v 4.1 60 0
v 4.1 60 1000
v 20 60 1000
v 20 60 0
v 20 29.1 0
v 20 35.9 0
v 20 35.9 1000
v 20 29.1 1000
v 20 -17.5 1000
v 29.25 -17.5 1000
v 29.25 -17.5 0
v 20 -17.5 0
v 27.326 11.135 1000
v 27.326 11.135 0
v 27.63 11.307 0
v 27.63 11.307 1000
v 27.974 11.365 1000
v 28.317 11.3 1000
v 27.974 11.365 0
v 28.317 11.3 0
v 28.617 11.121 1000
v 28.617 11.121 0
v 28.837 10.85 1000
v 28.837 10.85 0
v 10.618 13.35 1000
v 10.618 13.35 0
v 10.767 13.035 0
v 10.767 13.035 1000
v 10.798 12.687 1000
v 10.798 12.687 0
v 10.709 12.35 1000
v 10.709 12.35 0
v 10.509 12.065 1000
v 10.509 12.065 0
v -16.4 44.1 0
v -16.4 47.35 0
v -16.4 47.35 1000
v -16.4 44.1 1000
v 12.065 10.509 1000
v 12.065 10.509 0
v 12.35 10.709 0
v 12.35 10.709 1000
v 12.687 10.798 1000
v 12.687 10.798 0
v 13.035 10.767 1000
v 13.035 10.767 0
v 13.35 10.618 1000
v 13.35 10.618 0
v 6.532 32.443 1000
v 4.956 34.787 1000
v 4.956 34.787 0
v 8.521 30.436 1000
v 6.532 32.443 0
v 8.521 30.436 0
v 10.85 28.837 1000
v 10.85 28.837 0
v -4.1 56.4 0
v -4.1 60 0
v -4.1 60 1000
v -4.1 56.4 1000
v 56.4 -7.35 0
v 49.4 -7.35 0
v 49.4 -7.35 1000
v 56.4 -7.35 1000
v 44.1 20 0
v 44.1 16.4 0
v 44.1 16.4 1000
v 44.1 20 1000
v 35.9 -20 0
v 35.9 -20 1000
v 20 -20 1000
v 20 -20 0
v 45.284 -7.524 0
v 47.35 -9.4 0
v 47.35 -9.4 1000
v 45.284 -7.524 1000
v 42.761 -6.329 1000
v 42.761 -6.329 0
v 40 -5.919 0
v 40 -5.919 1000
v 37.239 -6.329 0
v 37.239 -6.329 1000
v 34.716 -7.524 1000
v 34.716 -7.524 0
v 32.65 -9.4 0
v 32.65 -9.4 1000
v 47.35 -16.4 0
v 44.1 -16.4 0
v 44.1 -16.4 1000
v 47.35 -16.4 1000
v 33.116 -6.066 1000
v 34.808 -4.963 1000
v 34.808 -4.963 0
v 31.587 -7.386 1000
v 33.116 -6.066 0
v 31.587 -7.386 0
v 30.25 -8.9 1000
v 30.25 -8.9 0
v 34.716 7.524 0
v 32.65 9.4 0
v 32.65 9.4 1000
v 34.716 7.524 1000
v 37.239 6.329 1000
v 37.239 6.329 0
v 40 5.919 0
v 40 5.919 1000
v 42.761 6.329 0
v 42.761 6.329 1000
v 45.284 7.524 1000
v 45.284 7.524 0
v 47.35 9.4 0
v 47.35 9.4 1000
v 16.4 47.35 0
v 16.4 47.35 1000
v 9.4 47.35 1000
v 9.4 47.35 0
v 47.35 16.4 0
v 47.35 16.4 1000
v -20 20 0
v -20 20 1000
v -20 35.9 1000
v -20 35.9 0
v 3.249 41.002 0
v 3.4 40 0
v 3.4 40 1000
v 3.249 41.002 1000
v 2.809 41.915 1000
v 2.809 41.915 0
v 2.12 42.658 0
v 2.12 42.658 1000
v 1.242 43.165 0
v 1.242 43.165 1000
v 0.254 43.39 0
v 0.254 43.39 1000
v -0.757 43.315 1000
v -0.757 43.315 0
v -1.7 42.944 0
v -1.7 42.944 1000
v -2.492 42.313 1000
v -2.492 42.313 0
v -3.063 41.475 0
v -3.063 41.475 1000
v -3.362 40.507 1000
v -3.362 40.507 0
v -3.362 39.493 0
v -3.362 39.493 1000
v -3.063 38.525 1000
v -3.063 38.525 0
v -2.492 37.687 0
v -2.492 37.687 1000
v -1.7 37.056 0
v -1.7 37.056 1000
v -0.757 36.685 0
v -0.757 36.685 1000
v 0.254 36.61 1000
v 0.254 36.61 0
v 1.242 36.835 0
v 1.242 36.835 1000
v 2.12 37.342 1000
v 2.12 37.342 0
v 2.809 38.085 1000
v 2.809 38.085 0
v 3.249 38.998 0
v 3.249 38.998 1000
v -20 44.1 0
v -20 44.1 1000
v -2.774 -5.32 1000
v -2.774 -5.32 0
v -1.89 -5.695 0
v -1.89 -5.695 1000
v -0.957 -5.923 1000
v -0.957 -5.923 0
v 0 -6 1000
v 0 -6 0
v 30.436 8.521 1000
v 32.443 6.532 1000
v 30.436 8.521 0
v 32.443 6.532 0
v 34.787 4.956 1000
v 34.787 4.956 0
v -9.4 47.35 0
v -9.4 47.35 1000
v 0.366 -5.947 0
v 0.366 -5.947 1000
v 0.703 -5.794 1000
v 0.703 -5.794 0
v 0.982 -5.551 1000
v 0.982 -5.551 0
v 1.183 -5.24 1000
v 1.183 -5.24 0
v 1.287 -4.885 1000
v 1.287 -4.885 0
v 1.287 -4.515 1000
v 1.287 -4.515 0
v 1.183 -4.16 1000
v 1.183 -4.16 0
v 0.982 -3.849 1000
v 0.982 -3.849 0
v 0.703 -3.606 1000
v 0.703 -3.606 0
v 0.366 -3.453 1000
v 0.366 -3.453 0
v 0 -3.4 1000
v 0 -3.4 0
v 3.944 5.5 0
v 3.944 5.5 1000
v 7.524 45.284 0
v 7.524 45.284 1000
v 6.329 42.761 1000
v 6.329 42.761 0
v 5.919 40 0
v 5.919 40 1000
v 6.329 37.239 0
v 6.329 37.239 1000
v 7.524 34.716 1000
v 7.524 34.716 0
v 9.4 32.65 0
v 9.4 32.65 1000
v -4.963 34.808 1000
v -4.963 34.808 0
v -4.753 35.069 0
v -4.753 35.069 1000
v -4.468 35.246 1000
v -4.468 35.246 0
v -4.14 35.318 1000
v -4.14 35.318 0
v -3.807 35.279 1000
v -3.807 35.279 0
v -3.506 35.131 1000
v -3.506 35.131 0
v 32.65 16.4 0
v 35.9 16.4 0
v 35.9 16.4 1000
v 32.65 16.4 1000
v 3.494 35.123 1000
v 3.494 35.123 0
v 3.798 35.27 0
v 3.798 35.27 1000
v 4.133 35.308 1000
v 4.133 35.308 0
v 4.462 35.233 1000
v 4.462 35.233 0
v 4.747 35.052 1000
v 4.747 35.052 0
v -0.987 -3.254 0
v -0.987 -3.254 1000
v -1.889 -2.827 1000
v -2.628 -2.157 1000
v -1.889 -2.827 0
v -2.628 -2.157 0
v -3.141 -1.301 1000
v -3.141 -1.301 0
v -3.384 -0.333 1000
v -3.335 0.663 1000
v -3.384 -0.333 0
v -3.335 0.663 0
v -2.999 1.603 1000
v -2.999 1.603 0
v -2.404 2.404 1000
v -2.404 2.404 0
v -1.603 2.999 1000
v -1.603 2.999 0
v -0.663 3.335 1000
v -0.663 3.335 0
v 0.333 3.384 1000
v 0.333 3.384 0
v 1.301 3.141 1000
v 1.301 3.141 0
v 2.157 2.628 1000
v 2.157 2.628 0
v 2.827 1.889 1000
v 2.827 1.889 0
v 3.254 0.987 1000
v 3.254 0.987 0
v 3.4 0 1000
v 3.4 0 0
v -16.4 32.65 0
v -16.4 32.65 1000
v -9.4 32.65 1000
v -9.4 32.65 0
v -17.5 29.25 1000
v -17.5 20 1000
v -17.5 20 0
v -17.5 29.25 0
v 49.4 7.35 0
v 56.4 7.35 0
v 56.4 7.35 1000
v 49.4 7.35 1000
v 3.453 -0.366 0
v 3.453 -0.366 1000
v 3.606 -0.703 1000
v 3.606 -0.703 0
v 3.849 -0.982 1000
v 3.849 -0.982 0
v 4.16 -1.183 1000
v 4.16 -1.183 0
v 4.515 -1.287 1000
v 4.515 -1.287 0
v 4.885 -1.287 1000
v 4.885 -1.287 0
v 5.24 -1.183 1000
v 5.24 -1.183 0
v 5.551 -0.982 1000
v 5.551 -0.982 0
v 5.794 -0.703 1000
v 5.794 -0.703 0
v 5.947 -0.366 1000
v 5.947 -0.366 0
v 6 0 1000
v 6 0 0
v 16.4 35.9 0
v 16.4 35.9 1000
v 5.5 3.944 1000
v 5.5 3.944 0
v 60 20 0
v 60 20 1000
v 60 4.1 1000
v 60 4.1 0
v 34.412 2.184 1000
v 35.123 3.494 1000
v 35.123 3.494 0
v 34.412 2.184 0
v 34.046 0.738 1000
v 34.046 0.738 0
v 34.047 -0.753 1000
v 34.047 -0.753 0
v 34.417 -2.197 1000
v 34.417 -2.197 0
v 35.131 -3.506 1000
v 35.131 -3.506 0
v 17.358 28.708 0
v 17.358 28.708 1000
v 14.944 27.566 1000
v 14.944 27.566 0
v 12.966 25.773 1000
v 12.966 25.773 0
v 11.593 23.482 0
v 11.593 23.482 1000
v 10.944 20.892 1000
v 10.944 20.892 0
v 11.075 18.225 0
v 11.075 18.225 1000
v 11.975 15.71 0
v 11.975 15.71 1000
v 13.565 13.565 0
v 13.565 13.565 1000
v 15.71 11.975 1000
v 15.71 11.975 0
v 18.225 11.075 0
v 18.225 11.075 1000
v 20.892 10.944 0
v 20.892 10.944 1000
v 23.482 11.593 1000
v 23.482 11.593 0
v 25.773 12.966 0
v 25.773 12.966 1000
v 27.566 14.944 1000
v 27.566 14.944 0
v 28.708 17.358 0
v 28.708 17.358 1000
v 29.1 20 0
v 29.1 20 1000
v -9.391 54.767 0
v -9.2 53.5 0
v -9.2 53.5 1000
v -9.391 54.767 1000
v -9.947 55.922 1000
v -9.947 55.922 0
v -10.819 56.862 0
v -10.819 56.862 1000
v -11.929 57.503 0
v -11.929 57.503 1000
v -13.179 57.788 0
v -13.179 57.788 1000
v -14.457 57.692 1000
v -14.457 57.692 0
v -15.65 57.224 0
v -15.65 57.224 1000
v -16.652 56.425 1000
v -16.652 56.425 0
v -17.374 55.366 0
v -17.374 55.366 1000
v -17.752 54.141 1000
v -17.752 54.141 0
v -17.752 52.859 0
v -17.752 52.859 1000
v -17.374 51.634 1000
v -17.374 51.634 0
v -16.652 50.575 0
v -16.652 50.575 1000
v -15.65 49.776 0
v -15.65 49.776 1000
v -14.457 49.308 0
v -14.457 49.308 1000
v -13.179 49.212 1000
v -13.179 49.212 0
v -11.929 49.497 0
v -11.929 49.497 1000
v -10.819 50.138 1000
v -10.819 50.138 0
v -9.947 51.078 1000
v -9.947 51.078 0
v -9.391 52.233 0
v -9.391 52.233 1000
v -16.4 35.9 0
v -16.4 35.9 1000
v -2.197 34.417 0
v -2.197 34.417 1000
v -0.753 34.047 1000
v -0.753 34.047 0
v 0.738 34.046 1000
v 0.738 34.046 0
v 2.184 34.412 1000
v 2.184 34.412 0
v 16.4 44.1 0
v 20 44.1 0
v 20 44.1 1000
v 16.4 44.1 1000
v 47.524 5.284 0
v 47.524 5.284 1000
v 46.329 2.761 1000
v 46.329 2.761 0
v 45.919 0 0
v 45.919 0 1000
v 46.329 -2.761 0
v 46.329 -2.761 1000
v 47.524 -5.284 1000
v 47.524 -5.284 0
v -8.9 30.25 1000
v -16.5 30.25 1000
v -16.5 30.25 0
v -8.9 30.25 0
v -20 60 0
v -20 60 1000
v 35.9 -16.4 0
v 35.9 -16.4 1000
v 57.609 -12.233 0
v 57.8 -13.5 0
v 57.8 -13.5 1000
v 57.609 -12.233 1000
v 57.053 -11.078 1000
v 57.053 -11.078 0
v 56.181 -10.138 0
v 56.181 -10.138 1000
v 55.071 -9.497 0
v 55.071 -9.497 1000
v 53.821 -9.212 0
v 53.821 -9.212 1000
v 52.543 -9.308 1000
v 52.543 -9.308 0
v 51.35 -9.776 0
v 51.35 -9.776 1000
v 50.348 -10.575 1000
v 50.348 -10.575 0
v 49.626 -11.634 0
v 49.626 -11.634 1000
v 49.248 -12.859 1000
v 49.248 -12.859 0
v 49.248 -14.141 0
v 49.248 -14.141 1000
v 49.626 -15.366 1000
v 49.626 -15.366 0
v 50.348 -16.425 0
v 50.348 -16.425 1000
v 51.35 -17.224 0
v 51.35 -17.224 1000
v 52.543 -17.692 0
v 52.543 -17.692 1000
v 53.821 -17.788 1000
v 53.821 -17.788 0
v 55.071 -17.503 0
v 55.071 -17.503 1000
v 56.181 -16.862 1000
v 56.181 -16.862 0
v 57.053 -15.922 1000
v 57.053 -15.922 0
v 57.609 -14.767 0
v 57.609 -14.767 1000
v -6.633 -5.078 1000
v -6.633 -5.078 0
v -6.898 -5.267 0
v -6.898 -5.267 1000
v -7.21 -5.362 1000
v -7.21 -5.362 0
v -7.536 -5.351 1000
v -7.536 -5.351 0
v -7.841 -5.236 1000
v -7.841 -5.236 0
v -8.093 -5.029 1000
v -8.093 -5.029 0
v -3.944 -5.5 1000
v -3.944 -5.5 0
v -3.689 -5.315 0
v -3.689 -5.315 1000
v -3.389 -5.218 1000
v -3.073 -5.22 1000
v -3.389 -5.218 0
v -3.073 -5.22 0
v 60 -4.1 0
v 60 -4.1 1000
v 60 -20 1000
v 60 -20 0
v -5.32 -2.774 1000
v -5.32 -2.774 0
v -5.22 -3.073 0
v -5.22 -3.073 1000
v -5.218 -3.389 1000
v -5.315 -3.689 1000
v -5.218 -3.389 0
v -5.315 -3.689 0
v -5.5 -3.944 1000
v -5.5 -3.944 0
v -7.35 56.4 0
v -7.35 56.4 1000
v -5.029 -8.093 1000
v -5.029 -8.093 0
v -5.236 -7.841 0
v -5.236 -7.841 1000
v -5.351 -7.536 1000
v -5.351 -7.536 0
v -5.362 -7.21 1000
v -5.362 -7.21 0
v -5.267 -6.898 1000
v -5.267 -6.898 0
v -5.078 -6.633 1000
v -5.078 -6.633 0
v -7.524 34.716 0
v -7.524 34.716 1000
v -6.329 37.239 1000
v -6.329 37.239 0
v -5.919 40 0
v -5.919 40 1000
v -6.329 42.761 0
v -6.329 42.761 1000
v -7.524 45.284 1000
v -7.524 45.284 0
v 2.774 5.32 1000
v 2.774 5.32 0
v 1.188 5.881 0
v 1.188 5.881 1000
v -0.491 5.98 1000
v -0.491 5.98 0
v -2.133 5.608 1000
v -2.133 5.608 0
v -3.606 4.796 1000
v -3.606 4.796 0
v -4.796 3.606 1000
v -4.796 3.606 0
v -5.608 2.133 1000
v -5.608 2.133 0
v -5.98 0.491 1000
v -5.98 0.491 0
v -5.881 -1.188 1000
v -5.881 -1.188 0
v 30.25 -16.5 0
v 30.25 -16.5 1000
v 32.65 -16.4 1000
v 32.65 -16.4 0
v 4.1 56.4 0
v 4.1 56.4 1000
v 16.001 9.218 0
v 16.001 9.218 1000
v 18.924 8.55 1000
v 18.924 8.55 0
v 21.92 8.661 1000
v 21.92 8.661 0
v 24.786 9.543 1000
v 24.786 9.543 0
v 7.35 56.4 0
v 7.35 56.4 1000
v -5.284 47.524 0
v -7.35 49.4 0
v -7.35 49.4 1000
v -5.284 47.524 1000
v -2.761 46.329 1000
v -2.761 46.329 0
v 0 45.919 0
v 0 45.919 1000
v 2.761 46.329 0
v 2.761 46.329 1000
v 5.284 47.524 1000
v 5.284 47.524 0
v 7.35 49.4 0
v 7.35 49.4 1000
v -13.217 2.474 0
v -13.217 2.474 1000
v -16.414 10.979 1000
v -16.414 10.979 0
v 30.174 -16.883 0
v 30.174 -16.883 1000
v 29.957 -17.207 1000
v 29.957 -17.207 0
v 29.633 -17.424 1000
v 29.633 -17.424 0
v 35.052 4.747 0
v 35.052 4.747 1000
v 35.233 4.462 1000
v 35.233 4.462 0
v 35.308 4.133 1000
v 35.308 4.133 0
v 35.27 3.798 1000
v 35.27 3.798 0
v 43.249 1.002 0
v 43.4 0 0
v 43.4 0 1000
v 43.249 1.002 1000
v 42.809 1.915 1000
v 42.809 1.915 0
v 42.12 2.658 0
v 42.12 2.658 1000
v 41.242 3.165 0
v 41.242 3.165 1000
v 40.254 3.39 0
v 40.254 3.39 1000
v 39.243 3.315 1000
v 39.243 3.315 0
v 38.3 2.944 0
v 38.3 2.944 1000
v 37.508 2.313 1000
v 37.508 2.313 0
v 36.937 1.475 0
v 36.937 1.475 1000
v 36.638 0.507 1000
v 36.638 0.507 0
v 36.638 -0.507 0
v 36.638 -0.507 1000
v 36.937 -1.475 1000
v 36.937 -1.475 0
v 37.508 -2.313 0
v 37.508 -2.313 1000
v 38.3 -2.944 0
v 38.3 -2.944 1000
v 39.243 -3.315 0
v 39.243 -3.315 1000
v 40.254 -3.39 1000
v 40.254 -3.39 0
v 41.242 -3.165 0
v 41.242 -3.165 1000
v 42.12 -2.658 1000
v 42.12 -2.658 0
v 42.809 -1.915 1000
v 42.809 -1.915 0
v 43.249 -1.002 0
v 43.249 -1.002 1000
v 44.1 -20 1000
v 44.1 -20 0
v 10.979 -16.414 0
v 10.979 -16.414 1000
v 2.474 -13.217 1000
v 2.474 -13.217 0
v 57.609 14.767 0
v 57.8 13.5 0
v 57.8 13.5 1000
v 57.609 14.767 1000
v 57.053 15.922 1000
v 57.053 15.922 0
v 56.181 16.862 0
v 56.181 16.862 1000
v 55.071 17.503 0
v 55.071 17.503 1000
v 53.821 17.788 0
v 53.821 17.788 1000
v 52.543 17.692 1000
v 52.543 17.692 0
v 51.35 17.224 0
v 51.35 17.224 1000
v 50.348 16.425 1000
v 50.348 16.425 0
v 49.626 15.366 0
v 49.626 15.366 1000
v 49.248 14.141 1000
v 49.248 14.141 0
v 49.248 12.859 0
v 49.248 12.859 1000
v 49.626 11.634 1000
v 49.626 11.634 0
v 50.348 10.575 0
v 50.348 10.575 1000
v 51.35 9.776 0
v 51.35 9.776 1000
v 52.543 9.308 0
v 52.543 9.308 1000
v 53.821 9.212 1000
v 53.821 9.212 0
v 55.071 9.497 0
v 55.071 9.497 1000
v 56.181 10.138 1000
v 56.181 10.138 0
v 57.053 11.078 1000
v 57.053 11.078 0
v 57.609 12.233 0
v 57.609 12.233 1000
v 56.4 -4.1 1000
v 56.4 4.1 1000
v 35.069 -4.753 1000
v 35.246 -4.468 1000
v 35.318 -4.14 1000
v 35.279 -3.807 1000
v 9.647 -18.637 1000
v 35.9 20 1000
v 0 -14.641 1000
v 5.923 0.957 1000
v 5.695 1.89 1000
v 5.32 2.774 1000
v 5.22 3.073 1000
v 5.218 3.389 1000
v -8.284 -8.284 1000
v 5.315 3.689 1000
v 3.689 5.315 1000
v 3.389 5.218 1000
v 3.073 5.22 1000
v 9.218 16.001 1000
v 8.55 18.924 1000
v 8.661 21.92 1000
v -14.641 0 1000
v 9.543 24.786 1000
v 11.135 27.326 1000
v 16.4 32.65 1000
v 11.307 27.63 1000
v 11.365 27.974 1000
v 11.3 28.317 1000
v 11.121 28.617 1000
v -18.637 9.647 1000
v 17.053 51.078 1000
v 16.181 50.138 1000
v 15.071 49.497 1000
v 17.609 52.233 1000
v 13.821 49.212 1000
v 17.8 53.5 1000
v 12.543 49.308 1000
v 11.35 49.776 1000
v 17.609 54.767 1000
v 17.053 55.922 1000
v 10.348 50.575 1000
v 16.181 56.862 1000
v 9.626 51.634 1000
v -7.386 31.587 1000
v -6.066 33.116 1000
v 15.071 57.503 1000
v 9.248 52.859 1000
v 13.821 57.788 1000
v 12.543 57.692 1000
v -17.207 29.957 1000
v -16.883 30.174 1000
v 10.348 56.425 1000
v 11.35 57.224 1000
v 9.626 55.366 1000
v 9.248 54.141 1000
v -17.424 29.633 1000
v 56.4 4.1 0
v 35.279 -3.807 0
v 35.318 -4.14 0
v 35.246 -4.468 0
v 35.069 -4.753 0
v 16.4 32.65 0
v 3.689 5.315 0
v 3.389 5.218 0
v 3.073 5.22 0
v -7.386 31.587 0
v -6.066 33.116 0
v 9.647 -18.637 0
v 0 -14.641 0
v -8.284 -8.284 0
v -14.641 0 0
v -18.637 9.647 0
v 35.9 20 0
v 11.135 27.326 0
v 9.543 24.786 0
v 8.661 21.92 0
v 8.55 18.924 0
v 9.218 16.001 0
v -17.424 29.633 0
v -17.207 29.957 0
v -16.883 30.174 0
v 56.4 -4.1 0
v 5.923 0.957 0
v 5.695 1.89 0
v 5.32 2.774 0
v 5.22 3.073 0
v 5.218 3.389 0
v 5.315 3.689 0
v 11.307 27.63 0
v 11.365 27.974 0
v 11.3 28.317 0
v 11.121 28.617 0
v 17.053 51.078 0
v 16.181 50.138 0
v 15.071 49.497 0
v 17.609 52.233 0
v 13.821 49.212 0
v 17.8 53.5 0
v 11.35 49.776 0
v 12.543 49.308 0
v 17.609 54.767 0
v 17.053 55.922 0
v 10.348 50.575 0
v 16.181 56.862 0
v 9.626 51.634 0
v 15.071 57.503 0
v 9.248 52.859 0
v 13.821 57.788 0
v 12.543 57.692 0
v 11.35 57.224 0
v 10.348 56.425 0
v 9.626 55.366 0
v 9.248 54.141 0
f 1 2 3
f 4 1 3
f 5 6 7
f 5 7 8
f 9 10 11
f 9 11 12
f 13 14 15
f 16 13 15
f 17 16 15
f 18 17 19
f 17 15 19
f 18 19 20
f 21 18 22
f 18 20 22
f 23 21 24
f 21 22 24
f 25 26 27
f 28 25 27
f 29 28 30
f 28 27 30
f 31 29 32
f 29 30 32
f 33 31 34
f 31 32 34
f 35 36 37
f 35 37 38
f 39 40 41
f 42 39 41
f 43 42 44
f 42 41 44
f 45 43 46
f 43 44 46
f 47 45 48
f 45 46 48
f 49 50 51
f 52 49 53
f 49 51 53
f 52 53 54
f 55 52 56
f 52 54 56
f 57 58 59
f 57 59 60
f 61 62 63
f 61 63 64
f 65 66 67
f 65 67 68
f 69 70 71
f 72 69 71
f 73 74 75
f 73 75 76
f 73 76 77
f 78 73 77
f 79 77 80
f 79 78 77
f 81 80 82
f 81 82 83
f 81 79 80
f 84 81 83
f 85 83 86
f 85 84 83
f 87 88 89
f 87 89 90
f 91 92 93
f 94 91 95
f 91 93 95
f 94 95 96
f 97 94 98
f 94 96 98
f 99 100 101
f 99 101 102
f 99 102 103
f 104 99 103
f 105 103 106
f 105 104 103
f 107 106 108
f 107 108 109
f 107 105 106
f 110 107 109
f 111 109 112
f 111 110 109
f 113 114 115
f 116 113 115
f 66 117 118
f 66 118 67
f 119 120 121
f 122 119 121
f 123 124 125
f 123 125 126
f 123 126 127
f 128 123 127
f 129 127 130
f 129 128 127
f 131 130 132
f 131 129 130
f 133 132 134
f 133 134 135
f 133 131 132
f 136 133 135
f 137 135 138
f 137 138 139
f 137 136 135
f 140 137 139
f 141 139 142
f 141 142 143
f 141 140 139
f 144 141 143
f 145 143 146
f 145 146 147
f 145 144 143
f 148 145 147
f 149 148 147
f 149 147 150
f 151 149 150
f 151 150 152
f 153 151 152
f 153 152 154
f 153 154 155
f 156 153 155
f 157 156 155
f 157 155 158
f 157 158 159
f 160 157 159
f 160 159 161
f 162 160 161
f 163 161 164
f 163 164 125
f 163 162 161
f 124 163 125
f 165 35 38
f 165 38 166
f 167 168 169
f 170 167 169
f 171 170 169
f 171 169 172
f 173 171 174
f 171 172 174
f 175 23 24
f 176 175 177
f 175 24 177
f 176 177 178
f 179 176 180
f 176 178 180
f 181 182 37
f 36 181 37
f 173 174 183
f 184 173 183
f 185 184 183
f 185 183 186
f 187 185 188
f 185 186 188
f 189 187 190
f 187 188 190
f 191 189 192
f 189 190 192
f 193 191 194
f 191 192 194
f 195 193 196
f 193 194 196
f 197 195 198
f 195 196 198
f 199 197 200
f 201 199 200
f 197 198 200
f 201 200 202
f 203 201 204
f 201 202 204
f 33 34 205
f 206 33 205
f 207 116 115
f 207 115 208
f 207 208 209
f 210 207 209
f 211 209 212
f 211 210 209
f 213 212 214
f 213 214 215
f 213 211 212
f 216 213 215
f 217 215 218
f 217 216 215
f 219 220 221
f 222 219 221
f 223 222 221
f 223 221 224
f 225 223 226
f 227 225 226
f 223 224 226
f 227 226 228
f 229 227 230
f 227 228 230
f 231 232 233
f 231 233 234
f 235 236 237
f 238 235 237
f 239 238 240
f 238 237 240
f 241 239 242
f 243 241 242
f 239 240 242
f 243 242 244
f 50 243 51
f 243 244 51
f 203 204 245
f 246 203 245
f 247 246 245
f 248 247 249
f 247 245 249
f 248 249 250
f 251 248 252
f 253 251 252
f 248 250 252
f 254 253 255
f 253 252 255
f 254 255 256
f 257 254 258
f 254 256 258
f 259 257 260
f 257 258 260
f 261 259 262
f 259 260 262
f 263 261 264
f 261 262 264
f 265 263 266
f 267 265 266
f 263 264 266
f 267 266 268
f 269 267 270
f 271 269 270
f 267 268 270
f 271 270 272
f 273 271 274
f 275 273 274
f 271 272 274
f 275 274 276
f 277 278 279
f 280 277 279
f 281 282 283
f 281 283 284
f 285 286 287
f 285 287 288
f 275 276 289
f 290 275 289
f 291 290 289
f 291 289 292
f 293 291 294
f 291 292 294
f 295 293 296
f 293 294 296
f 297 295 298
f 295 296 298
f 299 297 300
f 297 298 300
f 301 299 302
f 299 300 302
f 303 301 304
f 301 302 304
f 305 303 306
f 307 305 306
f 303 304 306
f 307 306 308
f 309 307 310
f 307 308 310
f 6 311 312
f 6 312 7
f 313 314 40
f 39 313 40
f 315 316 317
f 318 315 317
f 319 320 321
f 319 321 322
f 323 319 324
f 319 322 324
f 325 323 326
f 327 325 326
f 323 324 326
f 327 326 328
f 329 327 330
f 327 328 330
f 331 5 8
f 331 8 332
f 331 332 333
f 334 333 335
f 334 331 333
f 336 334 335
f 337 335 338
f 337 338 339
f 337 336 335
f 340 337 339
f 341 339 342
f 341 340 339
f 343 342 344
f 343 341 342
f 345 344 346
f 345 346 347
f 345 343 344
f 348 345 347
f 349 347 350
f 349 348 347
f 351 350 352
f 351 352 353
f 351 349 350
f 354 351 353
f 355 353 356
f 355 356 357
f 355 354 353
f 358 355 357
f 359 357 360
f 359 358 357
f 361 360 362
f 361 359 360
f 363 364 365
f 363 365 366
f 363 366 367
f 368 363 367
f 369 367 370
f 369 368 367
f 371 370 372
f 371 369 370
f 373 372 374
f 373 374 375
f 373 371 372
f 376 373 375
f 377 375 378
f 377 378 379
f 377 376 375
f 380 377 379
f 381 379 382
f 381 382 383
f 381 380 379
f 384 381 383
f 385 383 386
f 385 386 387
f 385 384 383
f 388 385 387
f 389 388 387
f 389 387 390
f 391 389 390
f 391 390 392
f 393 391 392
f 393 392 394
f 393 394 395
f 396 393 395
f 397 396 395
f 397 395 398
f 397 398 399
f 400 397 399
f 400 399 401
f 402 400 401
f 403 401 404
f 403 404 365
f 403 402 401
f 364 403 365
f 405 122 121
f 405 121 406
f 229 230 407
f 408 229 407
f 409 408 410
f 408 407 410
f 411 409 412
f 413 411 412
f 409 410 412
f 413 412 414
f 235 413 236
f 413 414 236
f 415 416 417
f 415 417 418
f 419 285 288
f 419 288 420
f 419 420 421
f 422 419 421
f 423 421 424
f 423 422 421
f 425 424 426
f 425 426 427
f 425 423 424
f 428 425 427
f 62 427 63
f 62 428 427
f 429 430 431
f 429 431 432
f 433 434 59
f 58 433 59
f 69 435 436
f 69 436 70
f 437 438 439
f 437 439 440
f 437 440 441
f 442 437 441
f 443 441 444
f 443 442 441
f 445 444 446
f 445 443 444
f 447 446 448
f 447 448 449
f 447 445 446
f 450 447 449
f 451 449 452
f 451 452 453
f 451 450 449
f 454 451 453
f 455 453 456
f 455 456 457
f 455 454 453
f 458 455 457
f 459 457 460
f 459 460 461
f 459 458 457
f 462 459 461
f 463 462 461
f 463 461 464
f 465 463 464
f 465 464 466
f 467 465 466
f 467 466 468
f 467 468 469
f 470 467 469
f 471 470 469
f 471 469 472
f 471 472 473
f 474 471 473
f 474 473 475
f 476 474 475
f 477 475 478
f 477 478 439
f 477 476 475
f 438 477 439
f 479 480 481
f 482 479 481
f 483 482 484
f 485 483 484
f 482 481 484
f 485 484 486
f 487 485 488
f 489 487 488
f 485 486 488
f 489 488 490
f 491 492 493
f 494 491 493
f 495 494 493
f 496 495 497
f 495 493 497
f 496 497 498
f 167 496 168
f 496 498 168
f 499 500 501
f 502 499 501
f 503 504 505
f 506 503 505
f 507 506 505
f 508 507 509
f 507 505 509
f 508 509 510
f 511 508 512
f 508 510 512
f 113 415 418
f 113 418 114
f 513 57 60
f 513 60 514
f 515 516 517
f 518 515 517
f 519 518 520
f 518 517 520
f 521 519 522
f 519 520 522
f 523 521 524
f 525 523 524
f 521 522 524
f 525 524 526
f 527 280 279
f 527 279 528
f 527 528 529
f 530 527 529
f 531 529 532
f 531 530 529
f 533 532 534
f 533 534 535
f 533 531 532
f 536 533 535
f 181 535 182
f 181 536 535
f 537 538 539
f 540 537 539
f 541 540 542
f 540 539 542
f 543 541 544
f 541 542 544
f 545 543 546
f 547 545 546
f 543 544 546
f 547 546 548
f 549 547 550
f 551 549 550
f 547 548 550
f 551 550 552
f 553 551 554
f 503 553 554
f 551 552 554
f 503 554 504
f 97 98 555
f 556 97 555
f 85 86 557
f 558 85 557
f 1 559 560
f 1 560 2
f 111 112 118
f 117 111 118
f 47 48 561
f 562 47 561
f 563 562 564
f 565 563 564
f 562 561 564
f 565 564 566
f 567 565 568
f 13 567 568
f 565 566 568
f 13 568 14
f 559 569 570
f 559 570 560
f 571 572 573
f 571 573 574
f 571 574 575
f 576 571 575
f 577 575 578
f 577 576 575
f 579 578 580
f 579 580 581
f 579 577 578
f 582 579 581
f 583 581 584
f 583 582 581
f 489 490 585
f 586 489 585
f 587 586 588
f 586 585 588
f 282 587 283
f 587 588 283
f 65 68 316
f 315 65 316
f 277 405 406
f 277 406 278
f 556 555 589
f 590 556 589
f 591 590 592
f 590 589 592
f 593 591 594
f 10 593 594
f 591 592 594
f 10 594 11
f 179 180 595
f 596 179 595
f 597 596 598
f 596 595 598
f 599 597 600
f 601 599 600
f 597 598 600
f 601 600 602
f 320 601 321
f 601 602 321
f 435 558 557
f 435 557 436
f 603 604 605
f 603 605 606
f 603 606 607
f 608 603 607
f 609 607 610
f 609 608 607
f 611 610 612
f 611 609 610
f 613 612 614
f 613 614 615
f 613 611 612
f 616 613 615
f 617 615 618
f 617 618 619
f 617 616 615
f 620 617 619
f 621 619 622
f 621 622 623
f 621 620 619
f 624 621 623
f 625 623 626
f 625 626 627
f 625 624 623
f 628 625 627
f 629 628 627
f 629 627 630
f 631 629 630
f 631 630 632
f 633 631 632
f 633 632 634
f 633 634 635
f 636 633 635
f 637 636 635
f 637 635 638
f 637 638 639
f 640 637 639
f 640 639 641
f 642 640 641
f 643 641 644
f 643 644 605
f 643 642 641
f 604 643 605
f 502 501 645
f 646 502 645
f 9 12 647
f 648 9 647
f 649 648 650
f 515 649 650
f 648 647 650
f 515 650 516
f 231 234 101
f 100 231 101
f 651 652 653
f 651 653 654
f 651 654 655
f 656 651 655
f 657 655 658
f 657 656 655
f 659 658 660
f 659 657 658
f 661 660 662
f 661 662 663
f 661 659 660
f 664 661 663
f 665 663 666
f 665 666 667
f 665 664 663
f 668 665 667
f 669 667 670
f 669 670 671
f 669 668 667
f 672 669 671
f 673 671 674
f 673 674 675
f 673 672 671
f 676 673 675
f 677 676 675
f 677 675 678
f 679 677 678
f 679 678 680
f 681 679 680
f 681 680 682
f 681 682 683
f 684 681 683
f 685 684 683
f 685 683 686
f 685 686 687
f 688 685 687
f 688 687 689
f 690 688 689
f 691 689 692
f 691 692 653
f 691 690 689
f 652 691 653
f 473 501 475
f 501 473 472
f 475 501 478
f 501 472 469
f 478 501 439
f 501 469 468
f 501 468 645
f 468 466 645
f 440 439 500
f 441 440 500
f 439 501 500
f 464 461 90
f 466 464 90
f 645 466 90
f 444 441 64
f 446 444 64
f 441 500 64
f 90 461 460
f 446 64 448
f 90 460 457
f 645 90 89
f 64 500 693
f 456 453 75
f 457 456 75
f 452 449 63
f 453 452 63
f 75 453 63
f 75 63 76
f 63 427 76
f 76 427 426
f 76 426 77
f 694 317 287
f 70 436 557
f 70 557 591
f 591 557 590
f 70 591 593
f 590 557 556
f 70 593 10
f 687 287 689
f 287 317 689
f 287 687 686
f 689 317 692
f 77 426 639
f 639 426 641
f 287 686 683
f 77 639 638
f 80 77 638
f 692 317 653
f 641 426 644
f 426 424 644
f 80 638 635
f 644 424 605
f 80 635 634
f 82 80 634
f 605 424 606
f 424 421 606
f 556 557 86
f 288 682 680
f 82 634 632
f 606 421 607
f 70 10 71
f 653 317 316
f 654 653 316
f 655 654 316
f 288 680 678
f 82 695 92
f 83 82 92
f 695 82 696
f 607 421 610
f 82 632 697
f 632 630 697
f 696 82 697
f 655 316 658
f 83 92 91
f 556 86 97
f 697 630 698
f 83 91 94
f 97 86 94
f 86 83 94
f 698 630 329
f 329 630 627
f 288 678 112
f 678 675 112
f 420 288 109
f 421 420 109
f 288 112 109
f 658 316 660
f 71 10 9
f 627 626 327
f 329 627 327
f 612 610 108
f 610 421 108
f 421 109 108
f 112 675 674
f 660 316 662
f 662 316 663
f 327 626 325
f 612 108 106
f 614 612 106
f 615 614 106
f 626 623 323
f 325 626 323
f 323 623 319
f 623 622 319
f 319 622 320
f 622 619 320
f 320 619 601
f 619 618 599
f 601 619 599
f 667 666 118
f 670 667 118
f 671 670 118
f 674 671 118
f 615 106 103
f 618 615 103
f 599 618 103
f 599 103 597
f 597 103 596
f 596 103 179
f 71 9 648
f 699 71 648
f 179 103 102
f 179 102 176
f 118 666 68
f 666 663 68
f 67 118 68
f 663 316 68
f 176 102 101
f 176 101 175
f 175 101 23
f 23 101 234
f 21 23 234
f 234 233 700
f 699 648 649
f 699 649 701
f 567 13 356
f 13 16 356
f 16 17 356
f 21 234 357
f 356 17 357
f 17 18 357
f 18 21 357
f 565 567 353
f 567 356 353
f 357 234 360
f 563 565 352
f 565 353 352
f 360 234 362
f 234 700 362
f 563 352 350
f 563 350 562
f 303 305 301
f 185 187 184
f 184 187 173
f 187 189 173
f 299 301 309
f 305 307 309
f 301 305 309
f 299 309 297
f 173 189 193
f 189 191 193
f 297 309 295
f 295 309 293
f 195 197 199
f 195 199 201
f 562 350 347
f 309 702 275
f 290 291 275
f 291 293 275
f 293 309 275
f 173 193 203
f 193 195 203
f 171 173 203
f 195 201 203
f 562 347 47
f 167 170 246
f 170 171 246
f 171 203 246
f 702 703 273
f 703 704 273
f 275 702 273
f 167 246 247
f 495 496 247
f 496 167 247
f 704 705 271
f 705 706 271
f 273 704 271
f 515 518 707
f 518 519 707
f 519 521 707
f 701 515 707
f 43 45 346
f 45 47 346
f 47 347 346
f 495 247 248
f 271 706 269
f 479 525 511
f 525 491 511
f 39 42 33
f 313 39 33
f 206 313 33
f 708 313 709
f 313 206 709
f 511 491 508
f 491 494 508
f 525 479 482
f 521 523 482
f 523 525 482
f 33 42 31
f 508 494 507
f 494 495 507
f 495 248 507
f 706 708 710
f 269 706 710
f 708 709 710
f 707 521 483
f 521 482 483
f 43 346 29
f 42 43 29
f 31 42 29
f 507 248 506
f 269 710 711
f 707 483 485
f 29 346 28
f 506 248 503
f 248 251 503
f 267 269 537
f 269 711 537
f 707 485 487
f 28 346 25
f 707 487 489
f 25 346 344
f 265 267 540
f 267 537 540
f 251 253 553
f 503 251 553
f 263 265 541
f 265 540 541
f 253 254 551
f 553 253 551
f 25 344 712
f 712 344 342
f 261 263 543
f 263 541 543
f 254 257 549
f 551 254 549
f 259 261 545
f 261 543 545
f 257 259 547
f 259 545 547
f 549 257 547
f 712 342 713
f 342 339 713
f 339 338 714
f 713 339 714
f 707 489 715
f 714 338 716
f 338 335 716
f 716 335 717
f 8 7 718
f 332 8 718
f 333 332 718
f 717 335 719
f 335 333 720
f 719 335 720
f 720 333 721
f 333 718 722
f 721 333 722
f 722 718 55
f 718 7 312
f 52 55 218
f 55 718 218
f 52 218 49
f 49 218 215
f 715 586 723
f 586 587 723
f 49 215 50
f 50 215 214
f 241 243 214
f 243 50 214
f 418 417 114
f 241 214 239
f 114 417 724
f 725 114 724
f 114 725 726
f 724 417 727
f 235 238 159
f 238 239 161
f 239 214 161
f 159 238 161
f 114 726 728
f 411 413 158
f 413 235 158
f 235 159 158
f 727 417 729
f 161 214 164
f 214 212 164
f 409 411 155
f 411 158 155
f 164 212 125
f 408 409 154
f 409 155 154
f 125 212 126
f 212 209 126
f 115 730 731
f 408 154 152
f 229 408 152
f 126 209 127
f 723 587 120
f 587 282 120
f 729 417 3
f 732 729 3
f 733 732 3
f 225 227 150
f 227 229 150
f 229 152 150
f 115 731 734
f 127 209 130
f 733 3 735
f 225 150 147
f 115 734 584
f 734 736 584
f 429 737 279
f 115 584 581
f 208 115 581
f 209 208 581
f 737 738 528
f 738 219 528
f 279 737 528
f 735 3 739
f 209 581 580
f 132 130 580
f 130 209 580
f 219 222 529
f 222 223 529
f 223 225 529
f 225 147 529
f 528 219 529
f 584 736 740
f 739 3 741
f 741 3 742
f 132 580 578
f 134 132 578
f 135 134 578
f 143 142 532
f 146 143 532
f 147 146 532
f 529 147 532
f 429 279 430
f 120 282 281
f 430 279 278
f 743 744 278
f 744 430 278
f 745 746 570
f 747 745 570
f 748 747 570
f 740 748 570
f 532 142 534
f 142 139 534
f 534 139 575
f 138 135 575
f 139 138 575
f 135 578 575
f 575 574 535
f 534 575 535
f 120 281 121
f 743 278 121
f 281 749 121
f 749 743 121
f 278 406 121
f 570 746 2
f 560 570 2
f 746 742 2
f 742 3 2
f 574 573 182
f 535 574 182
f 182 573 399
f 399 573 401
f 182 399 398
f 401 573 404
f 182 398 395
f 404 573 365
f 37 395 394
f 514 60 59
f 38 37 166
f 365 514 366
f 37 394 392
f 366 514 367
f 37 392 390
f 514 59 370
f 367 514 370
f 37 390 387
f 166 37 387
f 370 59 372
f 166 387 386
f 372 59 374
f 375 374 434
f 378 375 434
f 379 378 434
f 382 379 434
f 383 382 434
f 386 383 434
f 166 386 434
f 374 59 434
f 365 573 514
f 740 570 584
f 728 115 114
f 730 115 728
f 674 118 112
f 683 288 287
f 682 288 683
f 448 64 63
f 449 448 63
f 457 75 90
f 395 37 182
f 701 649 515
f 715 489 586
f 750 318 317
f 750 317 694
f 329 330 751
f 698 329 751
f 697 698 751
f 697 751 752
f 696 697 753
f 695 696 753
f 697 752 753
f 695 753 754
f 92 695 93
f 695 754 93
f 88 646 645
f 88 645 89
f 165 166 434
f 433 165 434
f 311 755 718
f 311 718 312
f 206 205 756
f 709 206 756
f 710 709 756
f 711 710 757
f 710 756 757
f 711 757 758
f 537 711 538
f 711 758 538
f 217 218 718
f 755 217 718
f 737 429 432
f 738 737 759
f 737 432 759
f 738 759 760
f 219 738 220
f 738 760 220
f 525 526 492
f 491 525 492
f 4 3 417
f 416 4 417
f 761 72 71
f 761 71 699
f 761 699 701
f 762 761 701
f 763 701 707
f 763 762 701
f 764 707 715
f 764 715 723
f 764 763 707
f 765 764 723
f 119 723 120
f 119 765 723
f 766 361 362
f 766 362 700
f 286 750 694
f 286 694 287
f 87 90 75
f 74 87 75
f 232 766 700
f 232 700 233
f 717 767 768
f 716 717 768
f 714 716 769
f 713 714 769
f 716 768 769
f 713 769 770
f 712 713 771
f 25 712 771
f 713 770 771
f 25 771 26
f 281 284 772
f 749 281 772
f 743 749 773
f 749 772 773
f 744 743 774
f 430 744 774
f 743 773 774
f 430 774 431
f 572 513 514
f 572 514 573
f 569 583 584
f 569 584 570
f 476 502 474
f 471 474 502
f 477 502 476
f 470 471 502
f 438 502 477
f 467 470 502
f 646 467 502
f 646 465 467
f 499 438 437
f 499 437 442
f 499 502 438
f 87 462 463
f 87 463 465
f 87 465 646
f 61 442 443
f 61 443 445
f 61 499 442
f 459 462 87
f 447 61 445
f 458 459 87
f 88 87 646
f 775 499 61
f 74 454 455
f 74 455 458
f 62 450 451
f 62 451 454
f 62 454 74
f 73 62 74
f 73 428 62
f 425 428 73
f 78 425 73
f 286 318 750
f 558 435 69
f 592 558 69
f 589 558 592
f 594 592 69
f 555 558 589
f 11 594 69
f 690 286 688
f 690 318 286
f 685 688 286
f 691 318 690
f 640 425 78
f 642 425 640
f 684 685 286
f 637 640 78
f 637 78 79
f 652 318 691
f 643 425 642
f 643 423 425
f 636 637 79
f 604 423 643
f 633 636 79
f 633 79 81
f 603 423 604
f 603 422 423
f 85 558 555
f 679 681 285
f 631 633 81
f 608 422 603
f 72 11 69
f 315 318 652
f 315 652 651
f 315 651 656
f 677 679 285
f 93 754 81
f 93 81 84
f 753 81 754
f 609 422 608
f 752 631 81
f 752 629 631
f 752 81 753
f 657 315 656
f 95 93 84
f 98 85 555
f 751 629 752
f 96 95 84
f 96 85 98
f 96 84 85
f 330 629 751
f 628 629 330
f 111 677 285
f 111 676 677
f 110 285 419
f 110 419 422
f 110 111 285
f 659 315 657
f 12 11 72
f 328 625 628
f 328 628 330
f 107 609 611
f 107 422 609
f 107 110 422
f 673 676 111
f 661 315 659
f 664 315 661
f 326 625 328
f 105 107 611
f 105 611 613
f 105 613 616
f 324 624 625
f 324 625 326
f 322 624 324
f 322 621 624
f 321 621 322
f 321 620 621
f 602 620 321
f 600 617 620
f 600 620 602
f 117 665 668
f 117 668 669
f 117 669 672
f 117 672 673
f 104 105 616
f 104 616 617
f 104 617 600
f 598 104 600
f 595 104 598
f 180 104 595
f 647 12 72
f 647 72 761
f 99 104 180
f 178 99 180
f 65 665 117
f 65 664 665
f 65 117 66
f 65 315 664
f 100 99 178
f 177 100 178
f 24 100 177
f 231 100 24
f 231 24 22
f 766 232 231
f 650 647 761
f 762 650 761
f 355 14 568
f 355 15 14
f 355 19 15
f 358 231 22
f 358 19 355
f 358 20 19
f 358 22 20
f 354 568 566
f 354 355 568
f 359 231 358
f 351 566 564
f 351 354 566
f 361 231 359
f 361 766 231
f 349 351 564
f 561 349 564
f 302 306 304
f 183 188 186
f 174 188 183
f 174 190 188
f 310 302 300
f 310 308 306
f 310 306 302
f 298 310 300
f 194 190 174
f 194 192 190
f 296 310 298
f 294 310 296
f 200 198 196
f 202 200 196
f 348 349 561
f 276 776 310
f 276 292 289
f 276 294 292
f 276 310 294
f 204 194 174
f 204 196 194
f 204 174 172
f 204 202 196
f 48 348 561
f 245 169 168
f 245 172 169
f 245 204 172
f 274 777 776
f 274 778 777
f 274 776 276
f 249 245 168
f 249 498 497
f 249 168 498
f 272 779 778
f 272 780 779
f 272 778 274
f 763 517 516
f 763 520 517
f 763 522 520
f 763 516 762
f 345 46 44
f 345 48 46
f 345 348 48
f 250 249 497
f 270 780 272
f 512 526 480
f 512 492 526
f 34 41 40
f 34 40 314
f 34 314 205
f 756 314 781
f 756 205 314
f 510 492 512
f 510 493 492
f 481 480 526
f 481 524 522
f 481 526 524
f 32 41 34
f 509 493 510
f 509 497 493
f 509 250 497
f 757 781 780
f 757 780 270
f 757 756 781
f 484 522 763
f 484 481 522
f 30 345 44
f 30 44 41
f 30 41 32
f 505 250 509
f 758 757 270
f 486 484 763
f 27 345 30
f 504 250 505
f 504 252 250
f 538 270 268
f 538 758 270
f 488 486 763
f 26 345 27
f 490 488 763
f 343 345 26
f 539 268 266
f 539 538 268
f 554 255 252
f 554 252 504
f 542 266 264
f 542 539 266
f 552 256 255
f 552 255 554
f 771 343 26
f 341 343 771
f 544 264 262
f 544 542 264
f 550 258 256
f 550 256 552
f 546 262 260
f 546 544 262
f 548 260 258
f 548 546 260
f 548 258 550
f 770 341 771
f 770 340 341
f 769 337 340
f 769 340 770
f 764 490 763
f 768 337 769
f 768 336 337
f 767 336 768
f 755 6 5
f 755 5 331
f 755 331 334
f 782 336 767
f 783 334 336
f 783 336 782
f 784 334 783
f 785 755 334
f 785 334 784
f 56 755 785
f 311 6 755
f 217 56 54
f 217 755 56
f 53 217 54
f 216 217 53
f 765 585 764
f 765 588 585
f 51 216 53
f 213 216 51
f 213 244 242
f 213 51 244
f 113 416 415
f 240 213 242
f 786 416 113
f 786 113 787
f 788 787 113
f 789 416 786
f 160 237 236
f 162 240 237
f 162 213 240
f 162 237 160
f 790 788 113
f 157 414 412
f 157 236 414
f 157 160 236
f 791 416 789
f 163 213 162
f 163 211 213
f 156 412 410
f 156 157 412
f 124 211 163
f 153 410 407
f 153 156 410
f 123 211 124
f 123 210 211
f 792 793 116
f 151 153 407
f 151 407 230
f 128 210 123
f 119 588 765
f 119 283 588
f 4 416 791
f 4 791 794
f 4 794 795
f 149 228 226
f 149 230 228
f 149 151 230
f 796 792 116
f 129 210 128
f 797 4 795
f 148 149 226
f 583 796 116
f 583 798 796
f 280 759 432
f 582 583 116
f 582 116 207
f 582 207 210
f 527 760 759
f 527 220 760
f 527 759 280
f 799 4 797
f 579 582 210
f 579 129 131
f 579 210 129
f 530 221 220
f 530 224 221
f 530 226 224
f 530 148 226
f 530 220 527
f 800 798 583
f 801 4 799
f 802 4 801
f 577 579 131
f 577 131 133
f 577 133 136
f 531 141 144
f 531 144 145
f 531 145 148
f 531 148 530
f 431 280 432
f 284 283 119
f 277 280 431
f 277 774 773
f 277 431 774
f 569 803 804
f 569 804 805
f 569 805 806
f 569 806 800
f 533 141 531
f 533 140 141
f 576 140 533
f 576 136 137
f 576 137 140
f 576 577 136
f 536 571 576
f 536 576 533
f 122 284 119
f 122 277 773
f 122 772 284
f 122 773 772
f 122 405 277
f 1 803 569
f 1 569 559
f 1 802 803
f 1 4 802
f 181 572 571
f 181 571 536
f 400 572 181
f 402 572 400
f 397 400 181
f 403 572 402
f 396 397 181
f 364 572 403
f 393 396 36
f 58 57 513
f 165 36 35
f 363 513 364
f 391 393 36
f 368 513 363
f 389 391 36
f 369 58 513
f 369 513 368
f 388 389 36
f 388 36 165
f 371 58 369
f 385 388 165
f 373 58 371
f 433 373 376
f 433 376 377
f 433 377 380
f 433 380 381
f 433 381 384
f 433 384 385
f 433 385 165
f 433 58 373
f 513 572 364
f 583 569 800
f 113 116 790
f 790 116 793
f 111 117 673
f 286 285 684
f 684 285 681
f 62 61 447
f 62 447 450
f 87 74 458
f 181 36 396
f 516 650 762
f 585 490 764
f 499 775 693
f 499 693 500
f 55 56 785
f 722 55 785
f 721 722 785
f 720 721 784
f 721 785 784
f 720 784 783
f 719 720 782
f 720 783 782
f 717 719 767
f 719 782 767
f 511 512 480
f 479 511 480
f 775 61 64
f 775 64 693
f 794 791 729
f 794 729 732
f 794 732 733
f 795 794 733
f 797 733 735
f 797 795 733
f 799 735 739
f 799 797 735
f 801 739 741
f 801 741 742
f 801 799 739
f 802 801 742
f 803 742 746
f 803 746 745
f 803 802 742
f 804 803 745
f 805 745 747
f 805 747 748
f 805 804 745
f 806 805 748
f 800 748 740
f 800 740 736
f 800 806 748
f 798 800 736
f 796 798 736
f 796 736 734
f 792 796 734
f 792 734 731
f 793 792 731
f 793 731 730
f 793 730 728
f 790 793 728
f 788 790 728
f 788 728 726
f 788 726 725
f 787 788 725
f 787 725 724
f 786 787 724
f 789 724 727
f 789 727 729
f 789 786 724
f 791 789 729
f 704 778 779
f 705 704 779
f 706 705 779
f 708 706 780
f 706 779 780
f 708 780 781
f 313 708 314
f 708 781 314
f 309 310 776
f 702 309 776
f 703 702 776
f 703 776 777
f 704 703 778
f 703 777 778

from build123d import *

# Parameters (mm, degrees)
SKETCH_1_R      = 3.4
SKETCH_1_R_2    = 4.3
EXTRUDE_1_DEPTH = 1000


with BuildPart() as part:
    # Эскиз1 → Бобышка-Вытянуть1 (new body)
    with BuildSketch(Plane.XY):
        with BuildLine():
            Line((-20, 47.35), (-20, 60))
            Line((-20, 60), (-7.35, 60))
            Line((-7.35, 60), (-4.1, 60))
            Line((-4.1, 60), (-4.1, 56.4))
            Line((-4.1, 56.4), (-7.35, 56.4))
            Line((-7.35, 56.4), (-7.35, 49.4))
            ThreePointArc((-7.35, 49.4), (0, 45.918928476), (7.35, 49.4))
            Line((7.35, 49.4), (7.35, 56.4))
            Line((7.35, 56.4), (4.1, 56.4))
            Line((4.1, 56.4), (4.1, 60))
            Line((4.1, 60), (7.35, 60))
            Line((7.35, 60), (20, 60))
            Line((20, 60), (20, 47.35))
            Line((20, 47.35), (20, 44.1))
            Line((20, 44.1), (16.4, 44.1))
            Line((16.4, 44.1), (16.4, 47.35))
            Line((16.4, 47.35), (9.4, 47.35))
            ThreePointArc((9.4, 47.35), (5.918928476, 40), (9.4, 32.65))
            Line((9.4, 32.65), (16.4, 32.65))
            Line((16.4, 32.65), (16.4, 35.9))
            Line((16.4, 35.9), (20, 35.9))
            Line((20, 35.9), (20, 32.65))
            Line((20, 32.65), (20, 29.1))
            ThreePointArc((20, 29.1), (13.565328291, 13.565328291), (29.1, 20))
            Line((29.1, 20), (32.65, 20))
            Line((32.65, 20), (35.9, 20))
            Line((35.9, 20), (35.9, 16.4))
            Line((35.9, 16.4), (32.65, 16.4))
            Line((32.65, 16.4), (32.65, 9.4))
            ThreePointArc((32.65, 9.4), (40, 5.918928476), (47.35, 9.4))
            Line((47.35, 9.4), (47.35, 16.4))
            Line((47.35, 16.4), (44.1, 16.4))
            Line((44.1, 16.4), (44.1, 20))
            Line((44.1, 20), (47.35, 20))
            Line((47.35, 20), (60, 20))
            Line((60, 20), (60, 7.35))
            Line((60, 7.35), (60, 4.1))
            Line((60, 4.1), (56.4, 4.1))
            Line((56.4, 4.1), (56.4, 7.35))
            Line((56.4, 7.35), (49.4, 7.35))
            ThreePointArc((49.4, 7.35), (45.918928476, 0), (49.4, -7.35))
            Line((49.4, -7.35), (56.4, -7.35))
            Line((56.4, -7.35), (56.4, -4.1))
            Line((56.4, -4.1), (60, -4.1))
            Line((60, -4.1), (60, -7.35))
            Line((60, -7.35), (60, -20))
            Line((60, -20), (47.35, -20))
            Line((47.35, -20), (44.1, -20))
            Line((44.1, -20), (44.1, -16.4))
            Line((44.1, -16.4), (47.35, -16.4))
            Line((47.35, -16.4), (47.35, -9.4))
            ThreePointArc((47.35, -9.4), (40, -5.918928476), (32.65, -9.4))
            Line((32.65, -9.4), (32.65, -16.4))
            Line((32.65, -16.4), (35.9, -16.4))
            Line((35.9, -16.4), (35.9, -20))
            Line((35.9, -20), (32.65, -20))
            Line((32.65, -20), (20, -20))
            ThreePointArc((20, -20), (-8.284271247, -8.284271247), (-20, 20))
            Line((-20, 20), (-20, 32.65))
            Line((-20, 32.65), (-20, 35.9))
            Line((-20, 35.9), (-16.4, 35.9))
            Line((-16.4, 35.9), (-16.4, 32.65))
            Line((-16.4, 32.65), (-9.4, 32.65))
            ThreePointArc((-9.4, 32.65), (-5.918928476, 40), (-9.4, 47.35))
            Line((-9.4, 47.35), (-16.4, 47.35))
            Line((-16.4, 47.35), (-16.4, 44.1))
            Line((-16.4, 44.1), (-20, 44.1))
            Line((-20, 44.1), (-20, 47.35))
        make_face()
        with Locations((0, 40)):
            Circle(SKETCH_1_R, mode=Mode.SUBTRACT)
        with Locations((-13.5, 53.5)):
            Circle(SKETCH_1_R_2, mode=Mode.SUBTRACT)
        with Locations((13.5, 53.5)):
            Circle(SKETCH_1_R_2, mode=Mode.SUBTRACT)
        with Locations((40, 0)):
            Circle(SKETCH_1_R, mode=Mode.SUBTRACT)
        with Locations((53.5, 13.5)):
            Circle(SKETCH_1_R_2, mode=Mode.SUBTRACT)
        with Locations((53.5, -13.5)):
            Circle(SKETCH_1_R_2, mode=Mode.SUBTRACT)
        with BuildLine():
            Line((-16.5, 30.25), (-8.9, 30.25))
            ThreePointArc((-8.9, 30.25), (-6.700552447, 32.329425303), (-4.963344147, 34.808071396))
            ThreePointArc((-4.963344147, 34.808071396), (-4.307204214, 35.295967153), (-3.506330333, 35.131155415))
            ThreePointArc((-3.506330333, 35.131155415), (-0.007297066, 34.000004437), (3.494477209, 35.122641182))
            ThreePointArc((3.494477209, 35.122641182), (4.300644961, 35.284393495), (4.955538691, 34.787217011))
            ThreePointArc((4.955538691, 34.787217011), (7.479168525, 31.392379507), (10.850248541, 28.837100905))
            ThreePointArc((10.850248541, 28.837100905), (11.347237818, 28.148388812), (11.135414137, 27.32592093))
            ThreePointArc((11.135414137, 27.32592093), (8.507881499, 20.42569046), (10.617718004, 13.349978606))
            ThreePointArc((10.617718004, 13.349978606), (10.798307809, 12.687415803), (10.508974176, 12.064609095))
            Line((10.508974176, 12.064609095), (3.943940688, 5.499575606))
            ThreePointArc((3.943940688, 5.499575606), (3.388591606, 5.218264662), (2.774429063, 5.320013475))
            ThreePointArc((2.774429063, 5.320013475), (-4.242640687, 4.242640687), (-5.320013475, -2.774429063))
            ThreePointArc((-5.320013475, -2.774429063), (-5.218264662, -3.388591606), (-5.499575606, -3.943940688))
            Line((-5.499575606, -3.943940688), (-6.633181618, -5.0775467))
            ThreePointArc((-6.633181618, -5.0775467), (-7.373462786, -5.369889497), (-8.092728627, -5.029100457))
            ThreePointArc((-8.092728627, -5.029100457), (-15.070519309, 6.630700987), (-17.5, 20))
            Line((-17.5, 20), (-17.5, 29.25))
            ThreePointArc((-17.5, 29.25), (-17.207106781, 29.957106781), (-16.5, 30.25))
        make_face(mode=Mode.SUBTRACT)
        with BuildLine():
            Line((29.25, -17.5), (20, -17.5))
            ThreePointArc((20, -17.5), (6.630700987, -15.070519309), (-5.029100457, -8.092728627))
            ThreePointArc((-5.029100457, -8.092728627), (-5.369889497, -7.373462786), (-5.0775467, -6.633181618))
            Line((-5.0775467, -6.633181618), (-3.943940688, -5.499575606))
            ThreePointArc((-3.943940688, -5.499575606), (-3.388591606, -5.218264662), (-2.774429063, -5.320013475))
            ThreePointArc((-2.774429063, -5.320013475), (-1.428271534, -5.827524382), (0, -6))
            ThreePointArc((0, -6), (1.3, -4.7), (0, -3.4))
            ThreePointArc((0, -3.4), (-2.404163056, 2.404163056), (3.4, 0))
            ThreePointArc((3.4, 0), (4.7, -1.3), (6, 0))
            ThreePointArc((6, 0), (5.827524382, 1.428271534), (5.320013475, 2.774429063))
            ThreePointArc((5.320013475, 2.774429063), (5.218264662, 3.388591606), (5.499575606, 3.943940688))
            Line((5.499575606, 3.943940688), (12.064609095, 10.508974176))
            ThreePointArc((12.064609095, 10.508974176), (12.687415803, 10.798307809), (13.349978606, 10.617718004))
            ThreePointArc((13.349978606, 10.617718004), (20.42569046, 8.507881499), (27.32592093, 11.135414137))
            ThreePointArc((27.32592093, 11.135414137), (28.148388812, 11.347237818), (28.837100905, 10.850248541))
            ThreePointArc((28.837100905, 10.850248541), (31.392379507, 7.479168525), (34.787217011, 4.955538691))
            ThreePointArc((34.787217011, 4.955538691), (35.284393495, 4.300644961), (35.122641182, 3.494477209))
            ThreePointArc((35.122641182, 3.494477209), (34.000004437, -0.007297066), (35.131155415, -3.506330333))
            ThreePointArc((35.131155415, -3.506330333), (35.295967153, -4.307204214), (34.808071396, -4.963344147))
            ThreePointArc((34.808071396, -4.963344147), (32.329425303, -6.700552447), (30.25, -8.9))
            Line((30.25, -8.9), (30.25, -16.5))
            ThreePointArc((30.25, -16.5), (29.957106781, -17.207106781), (29.25, -17.5))
        make_face(mode=Mode.SUBTRACT)
    extrude(amount=EXTRUDE_1_DEPTH)


solid = part.part
